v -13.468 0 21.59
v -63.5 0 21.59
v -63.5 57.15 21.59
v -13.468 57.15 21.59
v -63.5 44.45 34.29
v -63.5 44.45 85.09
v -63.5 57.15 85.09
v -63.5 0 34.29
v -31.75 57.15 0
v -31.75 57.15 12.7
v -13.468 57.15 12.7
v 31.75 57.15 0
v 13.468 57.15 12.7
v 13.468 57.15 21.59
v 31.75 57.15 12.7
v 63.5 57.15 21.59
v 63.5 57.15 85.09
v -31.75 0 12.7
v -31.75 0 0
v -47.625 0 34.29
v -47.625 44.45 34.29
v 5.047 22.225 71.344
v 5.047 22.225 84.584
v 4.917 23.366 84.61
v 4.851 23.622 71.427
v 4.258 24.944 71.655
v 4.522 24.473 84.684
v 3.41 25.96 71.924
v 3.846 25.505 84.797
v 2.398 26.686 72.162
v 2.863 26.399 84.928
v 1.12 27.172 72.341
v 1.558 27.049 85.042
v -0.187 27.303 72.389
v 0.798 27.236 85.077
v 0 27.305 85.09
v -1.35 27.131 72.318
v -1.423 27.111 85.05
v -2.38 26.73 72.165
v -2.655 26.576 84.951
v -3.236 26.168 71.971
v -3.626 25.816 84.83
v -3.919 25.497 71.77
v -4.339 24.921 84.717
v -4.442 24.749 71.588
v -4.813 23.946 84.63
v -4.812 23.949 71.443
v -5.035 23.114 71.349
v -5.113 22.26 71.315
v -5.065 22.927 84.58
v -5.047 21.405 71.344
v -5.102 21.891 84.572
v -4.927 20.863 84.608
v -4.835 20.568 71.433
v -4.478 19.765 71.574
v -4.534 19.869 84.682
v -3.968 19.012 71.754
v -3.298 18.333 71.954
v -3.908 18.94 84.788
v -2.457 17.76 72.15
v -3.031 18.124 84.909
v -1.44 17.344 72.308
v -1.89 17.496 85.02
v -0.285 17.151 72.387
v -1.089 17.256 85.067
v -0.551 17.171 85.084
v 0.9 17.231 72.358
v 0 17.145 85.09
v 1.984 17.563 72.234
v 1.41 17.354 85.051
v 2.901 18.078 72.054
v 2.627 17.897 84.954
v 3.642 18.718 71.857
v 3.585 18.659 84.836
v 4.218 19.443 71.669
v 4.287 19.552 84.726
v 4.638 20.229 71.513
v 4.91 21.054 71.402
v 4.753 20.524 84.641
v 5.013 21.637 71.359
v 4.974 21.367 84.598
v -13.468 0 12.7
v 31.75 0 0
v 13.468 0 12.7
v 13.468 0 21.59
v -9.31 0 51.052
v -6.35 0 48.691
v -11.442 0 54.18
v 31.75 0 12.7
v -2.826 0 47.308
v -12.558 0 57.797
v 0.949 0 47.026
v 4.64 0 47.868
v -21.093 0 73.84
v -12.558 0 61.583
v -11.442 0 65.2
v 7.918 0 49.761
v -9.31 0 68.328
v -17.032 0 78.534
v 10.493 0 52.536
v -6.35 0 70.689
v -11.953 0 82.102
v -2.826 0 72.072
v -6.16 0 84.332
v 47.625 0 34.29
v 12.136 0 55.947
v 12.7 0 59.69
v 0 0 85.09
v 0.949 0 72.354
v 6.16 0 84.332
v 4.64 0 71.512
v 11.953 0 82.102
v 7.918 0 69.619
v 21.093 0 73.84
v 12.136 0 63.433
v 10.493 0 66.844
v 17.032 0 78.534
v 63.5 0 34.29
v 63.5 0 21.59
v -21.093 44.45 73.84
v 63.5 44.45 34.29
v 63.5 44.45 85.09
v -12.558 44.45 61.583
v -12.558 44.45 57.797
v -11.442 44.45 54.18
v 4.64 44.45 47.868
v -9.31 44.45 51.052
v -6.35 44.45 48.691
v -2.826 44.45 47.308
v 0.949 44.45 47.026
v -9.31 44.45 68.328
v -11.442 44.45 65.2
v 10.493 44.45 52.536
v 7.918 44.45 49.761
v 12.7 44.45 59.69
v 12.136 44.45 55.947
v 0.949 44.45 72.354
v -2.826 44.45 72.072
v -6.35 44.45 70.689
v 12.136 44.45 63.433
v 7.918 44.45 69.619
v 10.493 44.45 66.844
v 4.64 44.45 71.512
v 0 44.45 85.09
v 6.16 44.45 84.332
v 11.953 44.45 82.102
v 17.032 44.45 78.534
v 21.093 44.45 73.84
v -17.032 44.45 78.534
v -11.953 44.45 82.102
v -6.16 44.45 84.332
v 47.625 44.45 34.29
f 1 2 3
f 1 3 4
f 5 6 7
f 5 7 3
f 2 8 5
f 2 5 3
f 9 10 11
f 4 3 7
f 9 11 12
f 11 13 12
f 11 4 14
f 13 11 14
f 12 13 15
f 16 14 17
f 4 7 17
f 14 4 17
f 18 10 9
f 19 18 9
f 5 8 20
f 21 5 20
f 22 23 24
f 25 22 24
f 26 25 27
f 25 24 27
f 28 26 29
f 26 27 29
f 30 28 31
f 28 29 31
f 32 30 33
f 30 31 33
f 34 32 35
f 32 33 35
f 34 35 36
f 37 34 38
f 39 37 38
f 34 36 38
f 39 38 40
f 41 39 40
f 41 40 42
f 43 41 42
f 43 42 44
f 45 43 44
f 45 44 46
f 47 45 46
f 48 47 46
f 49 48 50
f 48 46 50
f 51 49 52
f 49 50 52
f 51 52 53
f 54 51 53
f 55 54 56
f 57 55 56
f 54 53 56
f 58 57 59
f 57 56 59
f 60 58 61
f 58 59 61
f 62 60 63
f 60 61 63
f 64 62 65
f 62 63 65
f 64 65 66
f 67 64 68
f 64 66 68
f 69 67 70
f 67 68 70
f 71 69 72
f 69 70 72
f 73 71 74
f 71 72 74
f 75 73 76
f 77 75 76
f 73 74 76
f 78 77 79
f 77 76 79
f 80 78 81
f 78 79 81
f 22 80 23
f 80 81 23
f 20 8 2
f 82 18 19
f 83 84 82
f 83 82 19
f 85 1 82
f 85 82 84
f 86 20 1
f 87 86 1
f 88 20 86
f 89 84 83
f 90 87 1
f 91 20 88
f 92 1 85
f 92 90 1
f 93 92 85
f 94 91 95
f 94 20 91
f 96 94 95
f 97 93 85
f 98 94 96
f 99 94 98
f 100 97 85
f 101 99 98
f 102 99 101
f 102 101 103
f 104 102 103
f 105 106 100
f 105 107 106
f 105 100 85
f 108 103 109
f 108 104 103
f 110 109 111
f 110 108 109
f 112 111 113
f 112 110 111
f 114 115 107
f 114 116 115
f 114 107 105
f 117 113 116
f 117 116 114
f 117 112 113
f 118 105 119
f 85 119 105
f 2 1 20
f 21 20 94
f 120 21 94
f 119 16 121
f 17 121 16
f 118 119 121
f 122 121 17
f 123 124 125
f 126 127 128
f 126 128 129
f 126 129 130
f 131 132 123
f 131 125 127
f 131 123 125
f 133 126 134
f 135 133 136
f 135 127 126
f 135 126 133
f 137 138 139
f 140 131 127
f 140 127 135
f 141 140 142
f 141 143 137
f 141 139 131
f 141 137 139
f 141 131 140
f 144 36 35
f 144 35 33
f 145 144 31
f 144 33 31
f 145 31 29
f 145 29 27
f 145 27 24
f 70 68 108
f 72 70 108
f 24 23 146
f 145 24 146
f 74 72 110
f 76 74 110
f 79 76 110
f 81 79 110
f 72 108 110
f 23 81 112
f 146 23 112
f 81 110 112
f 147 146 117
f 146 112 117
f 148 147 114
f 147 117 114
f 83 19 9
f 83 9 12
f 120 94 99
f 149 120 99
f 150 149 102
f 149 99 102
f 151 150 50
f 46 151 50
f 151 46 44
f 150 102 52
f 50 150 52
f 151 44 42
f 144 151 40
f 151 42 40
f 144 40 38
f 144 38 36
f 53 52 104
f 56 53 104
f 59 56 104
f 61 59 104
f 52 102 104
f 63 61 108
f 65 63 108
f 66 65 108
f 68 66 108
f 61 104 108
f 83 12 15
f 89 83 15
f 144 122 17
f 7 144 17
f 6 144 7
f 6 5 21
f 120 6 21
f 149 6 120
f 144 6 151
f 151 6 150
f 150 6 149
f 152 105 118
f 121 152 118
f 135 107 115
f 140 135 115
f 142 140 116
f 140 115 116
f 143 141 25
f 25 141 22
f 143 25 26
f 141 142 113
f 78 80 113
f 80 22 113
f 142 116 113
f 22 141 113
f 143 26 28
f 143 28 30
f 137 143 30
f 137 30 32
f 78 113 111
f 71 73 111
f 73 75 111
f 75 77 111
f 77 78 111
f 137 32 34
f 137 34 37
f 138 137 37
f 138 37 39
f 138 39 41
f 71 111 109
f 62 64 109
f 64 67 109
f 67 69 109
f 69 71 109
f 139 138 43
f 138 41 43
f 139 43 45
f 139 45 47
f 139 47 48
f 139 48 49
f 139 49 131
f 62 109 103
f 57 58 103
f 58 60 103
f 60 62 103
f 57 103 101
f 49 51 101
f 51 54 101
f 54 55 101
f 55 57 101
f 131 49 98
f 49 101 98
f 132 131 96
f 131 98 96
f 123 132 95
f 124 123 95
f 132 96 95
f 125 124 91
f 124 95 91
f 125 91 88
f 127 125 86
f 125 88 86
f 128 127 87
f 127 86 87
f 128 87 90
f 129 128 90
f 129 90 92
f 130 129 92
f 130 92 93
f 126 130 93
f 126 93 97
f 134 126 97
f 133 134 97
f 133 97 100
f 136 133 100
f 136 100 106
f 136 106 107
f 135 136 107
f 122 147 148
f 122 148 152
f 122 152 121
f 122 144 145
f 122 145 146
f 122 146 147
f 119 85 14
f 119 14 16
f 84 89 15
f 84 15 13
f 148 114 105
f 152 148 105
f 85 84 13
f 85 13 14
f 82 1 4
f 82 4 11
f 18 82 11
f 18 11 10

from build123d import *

# Parameters (mm, degrees)
F1_DEPTH = 57.15
F2_R     = 12.7
F3_DEPTH = 44.45
F4_R     = 5.08
F5_DEPTH = 13.7758108493


# Not quite as in the source:
# - ends of sketch curves that miss each other by under 0.0002 mm in the source are joined


with BuildPart() as f1:
    # F0 (on Front) → F1 (new body)
    with BuildSketch(Plane.XZ):
        Polygon((-31.75, 0), (31.75, 0), (31.75, 12.7), (13.4683688998, 12.7), (13.4683688998, 21.59), (63.5, 21.59), (63.5, 85.09), (-63.5, 85.09), (-63.5, 21.59), (-13.4683688998, 21.59), (-13.4683688998, 12.7), (-31.75, 12.7), align=None)
    extrude(amount=-F1_DEPTH)

    # F2 (on face) → F3 (cut)
    with BuildSketch(Plane.XZ):
        with BuildLine():
            Line((0, 85.09), (-63.5, 85.09))
            Line((-63.5, 85.09), (-63.5, 34.29))
            Line((-63.5, 34.29), (-47.625, 34.29))
            Line((-47.625, 34.29), (-21.0934436414, 73.8401851094))
            ThreePointArc((-21.0934436414, 73.8401851094), (-11.9529513968, 82.101783869), (0, 85.09))
        make_face()
        with Locations((0, 59.69)):
            Circle(F2_R)
        with BuildLine():
            Line((63.5, 85.09), (0, 85.09))
            ThreePointArc((0, 85.09), (11.9529513968, 82.101783869), (21.0934436414, 73.8401851094))
            Line((21.0934436414, 73.8401851094), (47.625, 34.29))
            Line((47.625, 34.29), (63.5, 34.29))
            Line((63.5, 34.29), (63.5, 85.09))
        make_face()
    extrude(amount=-F3_DEPTH, mode=Mode.SUBTRACT)

    # F4 (on face) → F5 (cut, through all)
    with BuildSketch(Plane.XY.offset(85.09)):
        with Locations((-0.0332157188, 22.225)):
            Circle(F4_R)
    extrude(amount=-F5_DEPTH, mode=Mode.SUBTRACT)


solid = f1.part
